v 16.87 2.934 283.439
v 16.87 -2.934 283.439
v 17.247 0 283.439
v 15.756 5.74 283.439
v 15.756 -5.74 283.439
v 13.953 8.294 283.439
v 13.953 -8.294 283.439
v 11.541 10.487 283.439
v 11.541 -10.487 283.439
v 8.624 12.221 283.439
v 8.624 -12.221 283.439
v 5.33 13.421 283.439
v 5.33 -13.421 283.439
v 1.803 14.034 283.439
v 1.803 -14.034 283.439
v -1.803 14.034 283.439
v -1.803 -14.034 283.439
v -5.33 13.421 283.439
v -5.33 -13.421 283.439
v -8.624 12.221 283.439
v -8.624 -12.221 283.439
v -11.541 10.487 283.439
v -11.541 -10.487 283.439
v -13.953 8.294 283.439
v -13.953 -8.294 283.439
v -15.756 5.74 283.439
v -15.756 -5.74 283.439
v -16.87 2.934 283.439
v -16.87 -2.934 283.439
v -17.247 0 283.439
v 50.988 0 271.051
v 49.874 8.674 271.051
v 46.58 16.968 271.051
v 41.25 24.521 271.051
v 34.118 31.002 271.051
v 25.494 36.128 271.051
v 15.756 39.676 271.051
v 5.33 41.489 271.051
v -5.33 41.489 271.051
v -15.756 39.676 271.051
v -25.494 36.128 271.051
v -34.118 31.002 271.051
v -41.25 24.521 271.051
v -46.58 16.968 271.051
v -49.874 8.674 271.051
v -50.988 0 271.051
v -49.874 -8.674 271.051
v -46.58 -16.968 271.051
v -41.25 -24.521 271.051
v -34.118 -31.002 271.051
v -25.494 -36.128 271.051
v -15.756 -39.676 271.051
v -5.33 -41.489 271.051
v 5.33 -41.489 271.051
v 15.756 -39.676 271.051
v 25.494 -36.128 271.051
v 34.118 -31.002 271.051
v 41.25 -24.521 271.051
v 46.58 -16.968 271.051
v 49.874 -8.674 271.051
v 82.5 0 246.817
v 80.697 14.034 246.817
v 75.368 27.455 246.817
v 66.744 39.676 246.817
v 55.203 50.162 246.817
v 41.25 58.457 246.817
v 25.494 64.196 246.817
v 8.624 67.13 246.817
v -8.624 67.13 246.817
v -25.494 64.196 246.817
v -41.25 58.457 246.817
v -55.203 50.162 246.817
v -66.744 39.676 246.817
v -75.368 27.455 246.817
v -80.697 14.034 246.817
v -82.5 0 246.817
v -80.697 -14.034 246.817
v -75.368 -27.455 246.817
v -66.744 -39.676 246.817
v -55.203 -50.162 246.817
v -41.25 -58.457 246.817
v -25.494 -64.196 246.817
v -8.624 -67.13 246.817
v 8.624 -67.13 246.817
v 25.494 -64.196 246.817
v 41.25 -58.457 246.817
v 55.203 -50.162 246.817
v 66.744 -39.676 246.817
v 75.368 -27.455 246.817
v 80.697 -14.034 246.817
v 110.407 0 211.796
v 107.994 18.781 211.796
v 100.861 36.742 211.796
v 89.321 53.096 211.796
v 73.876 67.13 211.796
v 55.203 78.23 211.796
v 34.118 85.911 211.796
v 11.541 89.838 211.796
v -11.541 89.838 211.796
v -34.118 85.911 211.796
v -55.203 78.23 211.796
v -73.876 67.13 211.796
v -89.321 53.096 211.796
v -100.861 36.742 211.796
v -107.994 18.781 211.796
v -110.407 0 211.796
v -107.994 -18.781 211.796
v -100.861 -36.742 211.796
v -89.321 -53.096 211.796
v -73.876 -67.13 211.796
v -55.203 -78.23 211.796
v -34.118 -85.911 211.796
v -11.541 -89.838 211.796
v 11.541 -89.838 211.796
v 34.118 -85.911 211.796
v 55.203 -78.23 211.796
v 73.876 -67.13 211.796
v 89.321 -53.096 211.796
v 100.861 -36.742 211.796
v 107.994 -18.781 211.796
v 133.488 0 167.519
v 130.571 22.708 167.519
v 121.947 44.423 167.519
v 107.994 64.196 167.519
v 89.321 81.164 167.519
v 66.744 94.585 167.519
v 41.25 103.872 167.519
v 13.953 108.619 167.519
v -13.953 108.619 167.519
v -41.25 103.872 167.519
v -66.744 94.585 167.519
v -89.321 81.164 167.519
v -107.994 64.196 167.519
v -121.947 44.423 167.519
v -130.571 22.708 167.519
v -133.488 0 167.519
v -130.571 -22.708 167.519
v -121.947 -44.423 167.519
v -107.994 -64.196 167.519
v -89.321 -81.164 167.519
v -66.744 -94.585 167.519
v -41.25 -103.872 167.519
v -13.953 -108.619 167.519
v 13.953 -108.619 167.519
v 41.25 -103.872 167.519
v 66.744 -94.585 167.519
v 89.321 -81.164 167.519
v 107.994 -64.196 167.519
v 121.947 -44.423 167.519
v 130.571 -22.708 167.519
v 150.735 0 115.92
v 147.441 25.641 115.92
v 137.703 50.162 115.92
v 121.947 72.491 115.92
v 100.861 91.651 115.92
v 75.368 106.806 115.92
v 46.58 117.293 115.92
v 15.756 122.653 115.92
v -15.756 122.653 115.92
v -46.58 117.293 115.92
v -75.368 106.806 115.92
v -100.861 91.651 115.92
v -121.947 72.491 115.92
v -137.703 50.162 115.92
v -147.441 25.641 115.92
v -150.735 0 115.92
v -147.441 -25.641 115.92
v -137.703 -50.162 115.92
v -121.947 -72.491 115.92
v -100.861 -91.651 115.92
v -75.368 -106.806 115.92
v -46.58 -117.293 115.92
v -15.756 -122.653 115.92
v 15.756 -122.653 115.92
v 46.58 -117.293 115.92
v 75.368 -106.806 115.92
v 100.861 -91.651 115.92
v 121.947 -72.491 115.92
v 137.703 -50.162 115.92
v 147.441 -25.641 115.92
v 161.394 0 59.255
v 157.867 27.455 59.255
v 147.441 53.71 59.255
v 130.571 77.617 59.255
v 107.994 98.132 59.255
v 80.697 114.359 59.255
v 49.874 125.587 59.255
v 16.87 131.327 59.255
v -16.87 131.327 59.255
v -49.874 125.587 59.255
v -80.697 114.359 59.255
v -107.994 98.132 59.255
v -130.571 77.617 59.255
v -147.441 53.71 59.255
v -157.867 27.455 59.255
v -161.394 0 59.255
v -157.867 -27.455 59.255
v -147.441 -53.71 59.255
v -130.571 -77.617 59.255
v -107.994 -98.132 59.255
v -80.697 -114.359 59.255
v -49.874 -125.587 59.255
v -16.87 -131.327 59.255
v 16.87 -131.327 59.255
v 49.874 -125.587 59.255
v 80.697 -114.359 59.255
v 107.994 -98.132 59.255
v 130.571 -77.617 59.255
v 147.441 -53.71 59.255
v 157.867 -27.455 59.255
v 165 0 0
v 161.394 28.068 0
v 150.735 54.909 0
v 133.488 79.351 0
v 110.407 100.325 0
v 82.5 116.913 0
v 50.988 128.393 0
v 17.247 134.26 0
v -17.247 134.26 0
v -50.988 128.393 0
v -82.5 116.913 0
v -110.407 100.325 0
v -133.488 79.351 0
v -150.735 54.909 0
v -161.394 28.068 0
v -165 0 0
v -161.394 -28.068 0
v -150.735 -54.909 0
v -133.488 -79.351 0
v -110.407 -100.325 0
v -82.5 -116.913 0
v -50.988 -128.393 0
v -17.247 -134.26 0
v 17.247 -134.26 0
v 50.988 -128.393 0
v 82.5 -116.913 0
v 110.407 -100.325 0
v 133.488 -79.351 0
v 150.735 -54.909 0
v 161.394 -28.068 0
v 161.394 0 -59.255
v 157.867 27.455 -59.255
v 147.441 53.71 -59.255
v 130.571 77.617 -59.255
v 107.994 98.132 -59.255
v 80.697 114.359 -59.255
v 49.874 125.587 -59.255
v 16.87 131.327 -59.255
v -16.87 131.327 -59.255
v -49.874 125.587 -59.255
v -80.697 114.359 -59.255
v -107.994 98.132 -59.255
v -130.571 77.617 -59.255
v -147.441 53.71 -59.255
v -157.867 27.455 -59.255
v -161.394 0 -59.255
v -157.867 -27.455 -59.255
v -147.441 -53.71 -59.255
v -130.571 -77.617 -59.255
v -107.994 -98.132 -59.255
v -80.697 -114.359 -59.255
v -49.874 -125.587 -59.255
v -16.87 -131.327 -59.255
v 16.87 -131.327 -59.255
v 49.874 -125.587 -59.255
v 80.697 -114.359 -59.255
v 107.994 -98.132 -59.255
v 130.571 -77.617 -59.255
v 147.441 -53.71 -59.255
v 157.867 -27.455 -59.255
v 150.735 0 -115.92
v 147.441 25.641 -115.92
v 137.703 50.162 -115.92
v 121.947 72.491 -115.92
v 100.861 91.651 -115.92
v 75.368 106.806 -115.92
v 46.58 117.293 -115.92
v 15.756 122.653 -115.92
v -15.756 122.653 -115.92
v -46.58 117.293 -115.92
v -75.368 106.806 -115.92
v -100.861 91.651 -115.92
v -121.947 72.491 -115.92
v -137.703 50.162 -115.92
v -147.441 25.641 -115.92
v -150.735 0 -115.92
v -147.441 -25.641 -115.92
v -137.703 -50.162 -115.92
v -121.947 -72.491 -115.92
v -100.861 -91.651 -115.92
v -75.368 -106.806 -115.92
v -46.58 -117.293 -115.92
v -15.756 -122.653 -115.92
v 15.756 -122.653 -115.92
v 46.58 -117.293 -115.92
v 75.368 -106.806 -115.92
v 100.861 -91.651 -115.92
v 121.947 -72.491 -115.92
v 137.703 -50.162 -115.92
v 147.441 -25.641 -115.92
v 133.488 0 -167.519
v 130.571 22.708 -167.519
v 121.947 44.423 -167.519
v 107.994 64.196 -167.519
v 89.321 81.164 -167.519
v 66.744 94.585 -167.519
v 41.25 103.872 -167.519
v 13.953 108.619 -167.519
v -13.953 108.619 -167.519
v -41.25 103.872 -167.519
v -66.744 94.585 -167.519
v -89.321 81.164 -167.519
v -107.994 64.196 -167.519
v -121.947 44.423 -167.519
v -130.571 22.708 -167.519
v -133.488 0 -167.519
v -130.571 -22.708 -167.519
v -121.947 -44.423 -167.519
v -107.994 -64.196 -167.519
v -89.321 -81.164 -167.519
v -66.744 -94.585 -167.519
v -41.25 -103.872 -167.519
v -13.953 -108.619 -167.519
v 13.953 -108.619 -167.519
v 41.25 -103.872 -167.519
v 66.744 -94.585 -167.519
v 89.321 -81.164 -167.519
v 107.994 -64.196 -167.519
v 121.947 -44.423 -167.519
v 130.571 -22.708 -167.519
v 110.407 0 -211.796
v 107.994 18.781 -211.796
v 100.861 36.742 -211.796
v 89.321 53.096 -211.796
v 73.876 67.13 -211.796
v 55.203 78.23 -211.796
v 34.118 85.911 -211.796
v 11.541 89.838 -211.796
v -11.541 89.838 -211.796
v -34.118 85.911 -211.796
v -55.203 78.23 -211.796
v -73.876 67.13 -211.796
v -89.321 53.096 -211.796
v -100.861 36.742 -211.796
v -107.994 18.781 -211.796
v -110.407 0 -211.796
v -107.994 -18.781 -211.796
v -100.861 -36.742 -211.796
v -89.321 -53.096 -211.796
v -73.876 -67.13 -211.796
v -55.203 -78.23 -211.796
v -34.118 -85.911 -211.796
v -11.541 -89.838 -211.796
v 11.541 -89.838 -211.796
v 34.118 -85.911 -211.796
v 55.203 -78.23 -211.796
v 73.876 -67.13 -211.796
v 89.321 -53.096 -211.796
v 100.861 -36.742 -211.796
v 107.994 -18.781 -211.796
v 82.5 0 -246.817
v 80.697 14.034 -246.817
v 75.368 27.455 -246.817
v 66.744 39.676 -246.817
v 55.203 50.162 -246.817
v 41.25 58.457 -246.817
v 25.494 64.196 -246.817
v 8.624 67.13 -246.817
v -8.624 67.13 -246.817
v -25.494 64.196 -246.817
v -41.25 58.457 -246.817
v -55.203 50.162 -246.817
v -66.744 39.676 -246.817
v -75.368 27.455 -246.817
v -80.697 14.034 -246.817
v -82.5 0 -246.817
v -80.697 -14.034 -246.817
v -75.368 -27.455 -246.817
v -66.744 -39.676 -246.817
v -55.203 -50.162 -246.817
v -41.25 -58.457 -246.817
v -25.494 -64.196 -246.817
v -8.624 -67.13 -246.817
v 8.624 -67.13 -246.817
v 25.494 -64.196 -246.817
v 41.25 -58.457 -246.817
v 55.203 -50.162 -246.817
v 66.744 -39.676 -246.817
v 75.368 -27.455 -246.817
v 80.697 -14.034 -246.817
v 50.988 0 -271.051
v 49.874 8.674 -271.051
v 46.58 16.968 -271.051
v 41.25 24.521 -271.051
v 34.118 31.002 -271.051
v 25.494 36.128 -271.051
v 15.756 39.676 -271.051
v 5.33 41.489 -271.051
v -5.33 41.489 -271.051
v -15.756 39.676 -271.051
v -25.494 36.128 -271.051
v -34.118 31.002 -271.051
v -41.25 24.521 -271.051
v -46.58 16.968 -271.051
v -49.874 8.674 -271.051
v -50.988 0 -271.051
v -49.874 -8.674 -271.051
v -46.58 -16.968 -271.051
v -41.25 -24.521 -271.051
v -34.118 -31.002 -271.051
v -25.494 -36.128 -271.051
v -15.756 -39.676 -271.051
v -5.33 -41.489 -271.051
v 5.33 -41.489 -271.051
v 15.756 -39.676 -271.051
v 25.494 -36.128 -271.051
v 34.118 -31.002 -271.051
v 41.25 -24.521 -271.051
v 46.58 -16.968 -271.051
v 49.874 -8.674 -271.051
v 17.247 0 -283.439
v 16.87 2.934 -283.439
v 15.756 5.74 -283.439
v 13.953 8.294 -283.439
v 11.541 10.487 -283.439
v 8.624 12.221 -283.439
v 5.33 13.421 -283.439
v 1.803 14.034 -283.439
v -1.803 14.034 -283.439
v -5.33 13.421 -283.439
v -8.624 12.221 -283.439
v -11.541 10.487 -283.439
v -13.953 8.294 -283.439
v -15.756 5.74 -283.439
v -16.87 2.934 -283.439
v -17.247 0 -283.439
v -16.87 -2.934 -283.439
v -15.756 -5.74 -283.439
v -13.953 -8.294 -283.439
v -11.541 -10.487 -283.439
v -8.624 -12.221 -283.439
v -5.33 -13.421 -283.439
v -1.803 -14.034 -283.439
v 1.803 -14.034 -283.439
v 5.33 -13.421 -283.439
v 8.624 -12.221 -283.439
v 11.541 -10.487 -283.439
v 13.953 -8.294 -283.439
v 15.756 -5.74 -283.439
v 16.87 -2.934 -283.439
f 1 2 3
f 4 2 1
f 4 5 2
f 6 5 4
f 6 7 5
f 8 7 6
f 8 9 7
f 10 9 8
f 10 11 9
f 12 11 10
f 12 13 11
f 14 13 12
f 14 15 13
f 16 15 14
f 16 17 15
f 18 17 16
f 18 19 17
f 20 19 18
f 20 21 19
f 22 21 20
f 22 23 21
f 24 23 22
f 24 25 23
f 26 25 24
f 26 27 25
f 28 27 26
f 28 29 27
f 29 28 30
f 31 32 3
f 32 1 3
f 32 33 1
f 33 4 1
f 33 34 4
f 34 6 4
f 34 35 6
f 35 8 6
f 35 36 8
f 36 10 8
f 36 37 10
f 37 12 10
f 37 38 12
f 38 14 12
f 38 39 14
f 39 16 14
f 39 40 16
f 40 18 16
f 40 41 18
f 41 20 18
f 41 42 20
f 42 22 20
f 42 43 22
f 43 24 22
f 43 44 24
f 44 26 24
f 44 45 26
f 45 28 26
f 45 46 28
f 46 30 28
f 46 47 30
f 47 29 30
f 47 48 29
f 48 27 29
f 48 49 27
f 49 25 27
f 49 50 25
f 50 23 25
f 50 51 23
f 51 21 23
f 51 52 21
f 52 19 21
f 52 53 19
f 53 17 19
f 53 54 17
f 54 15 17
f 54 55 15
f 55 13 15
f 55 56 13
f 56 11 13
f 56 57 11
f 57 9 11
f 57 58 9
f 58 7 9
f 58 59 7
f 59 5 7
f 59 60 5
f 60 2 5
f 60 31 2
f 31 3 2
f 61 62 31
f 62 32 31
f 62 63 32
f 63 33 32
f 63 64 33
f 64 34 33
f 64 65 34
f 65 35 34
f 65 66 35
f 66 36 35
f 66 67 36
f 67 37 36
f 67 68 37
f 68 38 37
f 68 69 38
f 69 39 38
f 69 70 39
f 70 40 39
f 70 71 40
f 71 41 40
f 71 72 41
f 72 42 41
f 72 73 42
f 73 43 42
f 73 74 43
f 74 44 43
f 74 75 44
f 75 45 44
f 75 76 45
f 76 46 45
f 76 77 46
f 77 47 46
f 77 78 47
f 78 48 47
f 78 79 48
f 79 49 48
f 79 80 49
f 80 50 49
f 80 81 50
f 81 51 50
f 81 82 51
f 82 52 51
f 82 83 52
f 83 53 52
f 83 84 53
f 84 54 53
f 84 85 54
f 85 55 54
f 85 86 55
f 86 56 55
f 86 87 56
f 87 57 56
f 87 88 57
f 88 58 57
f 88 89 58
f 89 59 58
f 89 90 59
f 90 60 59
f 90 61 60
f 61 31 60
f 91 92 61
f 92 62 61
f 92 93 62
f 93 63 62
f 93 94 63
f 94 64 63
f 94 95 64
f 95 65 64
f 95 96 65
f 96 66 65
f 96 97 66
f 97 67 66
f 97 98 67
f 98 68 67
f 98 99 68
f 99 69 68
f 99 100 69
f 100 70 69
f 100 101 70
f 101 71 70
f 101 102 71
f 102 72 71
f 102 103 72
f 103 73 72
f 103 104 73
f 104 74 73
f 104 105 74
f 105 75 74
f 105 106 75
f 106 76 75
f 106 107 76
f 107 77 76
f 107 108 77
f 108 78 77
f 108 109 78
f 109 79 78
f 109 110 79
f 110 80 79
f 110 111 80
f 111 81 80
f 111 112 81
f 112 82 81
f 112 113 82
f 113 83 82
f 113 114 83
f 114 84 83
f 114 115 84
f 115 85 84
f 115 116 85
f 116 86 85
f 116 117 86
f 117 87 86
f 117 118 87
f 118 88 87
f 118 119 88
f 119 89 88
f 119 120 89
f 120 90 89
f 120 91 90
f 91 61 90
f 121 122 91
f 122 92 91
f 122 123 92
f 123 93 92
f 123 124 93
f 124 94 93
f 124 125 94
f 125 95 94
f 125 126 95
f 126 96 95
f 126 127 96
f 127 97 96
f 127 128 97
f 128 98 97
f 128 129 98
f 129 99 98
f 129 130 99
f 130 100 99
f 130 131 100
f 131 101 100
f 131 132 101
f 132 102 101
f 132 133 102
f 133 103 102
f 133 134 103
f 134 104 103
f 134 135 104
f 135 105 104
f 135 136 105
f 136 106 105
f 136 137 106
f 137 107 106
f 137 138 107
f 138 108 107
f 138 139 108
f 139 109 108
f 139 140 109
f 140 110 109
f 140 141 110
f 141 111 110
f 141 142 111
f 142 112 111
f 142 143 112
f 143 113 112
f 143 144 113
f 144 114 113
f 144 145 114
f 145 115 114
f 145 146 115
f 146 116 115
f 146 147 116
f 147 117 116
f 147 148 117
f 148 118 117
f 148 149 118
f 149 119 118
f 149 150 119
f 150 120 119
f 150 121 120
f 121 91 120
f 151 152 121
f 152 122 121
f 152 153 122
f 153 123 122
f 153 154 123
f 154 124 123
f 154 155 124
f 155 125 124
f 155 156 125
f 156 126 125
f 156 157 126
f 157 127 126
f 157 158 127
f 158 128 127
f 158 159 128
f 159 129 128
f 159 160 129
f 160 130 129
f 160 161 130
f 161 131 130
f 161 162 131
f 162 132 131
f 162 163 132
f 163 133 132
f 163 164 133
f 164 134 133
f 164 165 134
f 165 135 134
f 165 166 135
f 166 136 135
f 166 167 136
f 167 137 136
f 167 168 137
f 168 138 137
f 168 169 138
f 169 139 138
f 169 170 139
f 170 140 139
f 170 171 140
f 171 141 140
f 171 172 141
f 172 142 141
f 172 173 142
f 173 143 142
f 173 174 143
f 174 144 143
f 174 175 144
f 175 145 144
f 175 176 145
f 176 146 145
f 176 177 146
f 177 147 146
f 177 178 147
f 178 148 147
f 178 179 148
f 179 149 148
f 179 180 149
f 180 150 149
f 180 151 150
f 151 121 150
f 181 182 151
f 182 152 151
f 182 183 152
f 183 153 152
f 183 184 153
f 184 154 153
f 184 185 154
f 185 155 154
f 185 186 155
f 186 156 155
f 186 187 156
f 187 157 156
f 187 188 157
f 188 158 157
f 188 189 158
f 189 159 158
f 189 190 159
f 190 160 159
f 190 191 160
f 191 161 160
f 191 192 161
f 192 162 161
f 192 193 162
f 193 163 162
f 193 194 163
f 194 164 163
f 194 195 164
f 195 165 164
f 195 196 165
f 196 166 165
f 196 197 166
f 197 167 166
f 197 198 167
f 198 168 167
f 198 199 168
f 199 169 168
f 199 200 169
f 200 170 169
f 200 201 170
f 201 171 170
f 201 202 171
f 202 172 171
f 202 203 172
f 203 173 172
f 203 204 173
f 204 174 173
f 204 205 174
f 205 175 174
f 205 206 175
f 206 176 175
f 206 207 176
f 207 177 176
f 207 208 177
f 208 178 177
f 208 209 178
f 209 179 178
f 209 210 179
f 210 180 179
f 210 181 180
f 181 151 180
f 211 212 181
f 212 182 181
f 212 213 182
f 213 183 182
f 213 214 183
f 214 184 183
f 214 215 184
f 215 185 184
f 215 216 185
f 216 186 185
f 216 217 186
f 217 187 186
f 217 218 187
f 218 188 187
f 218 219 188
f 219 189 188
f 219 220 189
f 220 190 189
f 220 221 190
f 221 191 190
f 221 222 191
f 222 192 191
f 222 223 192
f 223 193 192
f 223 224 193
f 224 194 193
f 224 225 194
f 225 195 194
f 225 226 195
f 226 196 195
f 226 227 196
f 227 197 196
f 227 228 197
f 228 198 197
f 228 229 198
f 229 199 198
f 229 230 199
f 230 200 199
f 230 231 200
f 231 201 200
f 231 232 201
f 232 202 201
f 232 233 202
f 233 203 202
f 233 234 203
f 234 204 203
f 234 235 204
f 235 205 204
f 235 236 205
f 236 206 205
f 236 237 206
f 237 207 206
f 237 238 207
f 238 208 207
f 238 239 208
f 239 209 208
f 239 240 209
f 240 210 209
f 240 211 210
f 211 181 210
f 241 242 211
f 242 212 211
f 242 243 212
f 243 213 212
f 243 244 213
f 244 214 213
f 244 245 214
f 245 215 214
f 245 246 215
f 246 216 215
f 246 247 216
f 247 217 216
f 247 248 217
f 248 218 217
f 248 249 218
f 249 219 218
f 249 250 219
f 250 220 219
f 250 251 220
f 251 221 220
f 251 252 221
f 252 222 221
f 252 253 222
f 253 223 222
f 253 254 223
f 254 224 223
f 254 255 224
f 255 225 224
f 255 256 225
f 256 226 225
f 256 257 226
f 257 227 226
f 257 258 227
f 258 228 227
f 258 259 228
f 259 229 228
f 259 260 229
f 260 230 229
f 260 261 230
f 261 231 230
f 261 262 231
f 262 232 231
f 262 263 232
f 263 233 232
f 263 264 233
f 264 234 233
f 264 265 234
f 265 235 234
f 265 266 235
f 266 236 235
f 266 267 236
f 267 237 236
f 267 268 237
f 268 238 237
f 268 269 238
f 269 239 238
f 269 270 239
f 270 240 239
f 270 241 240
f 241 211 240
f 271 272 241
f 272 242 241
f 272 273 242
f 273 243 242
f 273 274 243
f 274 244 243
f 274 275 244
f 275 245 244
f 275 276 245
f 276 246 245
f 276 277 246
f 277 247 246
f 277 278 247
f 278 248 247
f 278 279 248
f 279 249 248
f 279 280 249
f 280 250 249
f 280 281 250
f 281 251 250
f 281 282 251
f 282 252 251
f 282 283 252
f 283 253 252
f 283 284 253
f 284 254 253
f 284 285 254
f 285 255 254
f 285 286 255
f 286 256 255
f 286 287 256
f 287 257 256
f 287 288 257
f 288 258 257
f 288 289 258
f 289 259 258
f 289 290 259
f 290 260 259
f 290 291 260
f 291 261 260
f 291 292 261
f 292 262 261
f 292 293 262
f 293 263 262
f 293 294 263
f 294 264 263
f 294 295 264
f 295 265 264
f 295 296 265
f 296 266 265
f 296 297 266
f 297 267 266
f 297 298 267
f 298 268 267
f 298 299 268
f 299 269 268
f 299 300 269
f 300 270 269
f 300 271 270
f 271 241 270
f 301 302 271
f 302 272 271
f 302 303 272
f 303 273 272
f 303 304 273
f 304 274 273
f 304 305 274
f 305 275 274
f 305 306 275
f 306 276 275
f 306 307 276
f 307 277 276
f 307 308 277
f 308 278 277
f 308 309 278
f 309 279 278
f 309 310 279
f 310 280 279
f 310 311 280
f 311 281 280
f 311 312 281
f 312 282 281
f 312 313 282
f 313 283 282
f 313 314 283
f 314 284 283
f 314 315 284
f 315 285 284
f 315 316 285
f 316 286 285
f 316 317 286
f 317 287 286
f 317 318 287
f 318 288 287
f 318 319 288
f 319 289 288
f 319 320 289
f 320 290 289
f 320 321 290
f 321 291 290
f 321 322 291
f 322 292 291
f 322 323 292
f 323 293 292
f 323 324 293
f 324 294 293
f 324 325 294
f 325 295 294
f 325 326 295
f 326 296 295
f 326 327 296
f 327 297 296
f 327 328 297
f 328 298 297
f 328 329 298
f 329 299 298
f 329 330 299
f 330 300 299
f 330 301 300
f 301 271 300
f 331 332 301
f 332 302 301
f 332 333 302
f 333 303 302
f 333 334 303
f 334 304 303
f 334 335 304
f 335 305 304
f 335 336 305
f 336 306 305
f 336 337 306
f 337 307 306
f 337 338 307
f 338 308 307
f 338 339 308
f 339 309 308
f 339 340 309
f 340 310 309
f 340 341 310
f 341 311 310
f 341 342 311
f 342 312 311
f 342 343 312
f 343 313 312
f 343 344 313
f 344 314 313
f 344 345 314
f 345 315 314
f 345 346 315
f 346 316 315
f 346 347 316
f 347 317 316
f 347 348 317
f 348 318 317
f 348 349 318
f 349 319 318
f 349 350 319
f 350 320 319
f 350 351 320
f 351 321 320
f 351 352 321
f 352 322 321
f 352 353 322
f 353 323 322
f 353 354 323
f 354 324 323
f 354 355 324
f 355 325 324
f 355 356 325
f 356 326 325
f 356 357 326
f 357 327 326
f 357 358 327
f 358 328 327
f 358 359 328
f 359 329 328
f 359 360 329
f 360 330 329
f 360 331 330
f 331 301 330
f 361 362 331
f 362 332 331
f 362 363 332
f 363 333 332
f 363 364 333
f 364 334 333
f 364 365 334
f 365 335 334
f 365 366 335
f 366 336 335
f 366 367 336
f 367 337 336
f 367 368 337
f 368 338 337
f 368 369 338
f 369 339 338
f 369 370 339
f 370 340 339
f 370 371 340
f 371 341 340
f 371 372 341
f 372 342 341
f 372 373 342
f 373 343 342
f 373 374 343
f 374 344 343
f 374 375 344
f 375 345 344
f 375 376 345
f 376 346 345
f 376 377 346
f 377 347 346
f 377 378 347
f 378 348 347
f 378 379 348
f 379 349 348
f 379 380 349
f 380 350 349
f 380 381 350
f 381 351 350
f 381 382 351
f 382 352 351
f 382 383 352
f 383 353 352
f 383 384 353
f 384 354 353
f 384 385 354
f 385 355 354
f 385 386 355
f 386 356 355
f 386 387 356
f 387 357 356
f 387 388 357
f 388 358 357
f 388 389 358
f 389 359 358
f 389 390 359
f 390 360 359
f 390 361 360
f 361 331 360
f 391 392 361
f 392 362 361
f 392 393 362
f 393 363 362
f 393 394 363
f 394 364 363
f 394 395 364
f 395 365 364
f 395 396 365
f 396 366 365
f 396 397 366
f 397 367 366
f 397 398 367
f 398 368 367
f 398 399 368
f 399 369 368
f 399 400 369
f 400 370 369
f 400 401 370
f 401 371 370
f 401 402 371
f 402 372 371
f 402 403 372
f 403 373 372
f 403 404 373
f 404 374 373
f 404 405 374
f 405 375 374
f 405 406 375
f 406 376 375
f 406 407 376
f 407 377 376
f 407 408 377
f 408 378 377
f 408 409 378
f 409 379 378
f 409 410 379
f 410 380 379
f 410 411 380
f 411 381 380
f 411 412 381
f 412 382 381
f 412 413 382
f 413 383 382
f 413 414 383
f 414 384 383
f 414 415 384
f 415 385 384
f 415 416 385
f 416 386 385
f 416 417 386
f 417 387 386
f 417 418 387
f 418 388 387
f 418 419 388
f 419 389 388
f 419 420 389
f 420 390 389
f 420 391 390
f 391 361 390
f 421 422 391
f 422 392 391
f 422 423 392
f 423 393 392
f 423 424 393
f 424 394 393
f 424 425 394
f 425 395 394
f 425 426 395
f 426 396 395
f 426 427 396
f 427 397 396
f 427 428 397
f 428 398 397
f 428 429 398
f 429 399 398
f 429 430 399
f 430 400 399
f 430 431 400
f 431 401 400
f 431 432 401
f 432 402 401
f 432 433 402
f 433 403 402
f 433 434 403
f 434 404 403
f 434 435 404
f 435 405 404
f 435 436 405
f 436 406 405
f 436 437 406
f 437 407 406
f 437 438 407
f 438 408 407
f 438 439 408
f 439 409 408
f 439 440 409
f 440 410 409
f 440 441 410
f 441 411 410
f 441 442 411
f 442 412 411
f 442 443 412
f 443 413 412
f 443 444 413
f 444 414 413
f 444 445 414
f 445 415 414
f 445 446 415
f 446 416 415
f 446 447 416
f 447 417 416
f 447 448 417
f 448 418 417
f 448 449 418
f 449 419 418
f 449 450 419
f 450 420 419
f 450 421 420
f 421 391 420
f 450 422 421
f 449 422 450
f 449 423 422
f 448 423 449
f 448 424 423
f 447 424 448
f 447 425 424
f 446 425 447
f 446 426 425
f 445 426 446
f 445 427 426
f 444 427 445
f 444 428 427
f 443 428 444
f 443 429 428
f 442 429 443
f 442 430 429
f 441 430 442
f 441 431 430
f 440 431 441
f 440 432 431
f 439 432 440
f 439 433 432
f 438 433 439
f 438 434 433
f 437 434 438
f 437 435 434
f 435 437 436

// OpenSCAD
// Generated by SolidPython 1.0.1 on 2020-07-29 00:46:49


scale(v = [11, 9, 19]) {
	sphere(r = 15);
}
/***********************************************
*********      SolidPython code:      **********
************************************************
 
# import packages: SolidPython
from solid import *
from solid.utils import *
from itertools import chain, combinations, permutations


class Resize:

    def __init__(self, scad_file):
        self.scad_file = scad_file
        #self.scad_file = import_scad(scad_file)
        # cone/cylinder param:
        self.r1 = 0
        self.r2 = 0
        self.h = 0
        # rectangular prism param:
        self.w = 0
        self.l = 0
        # ellipse param:
        self.r = 0

    # import OpenScad code (file name corresponds to shape)


    # classify shape + parameters
    def assign(self, param1, param2, param3):
        if self.scad_file == 'cone.scad':
            self.r1 = param1
            self.r2 = param2
            self.h = param3
        elif self.scad_file == 'cylinder.scad':
            self.r1 = param1
            self.r2 = param2
            self.h = param3
        elif self.scad_file == 'rectangularPrism.scad':
            self.h = param1
            self.l = param2
            self.w = param3
        else:
            self.r = param1
            self.h = param2

    # resize parameters
    def iterate(self):
        x = range(3, 20, 2)
        i = 1
        if self.scad_file == 'cone.scad':
            tempList = list(permutations(x, 2))
            for temp in tempList:
                param1 = temp[0]
                param2 = temp[1]
                filepath = 'produced_scad_files/' + 'cone' + str(param1) + '_' + str(param2) + '_' + '.scad'
                scad_render_to_file(cylinder(h=param1, r1=param2, r2=0), filepath)

        elif self.scad_file == 'cylinder.scad':
            tempList = list(permutations(x, 3))
            for temp in tempList:
                param1 = temp[0]
                param2 = temp[1]
                filepath = 'produced_scad_files/' + 'cylinder' + str(param1) + '_' + str(param2) + '_' + '.scad'
                scad_render_to_file(cylinder(h=param1, r1=param2, r2=param2), filepath)

        elif self.scad_file == 'rectangularPrism.scad':
            tempList = list(permutations(x, 3))
            for temp in tempList:
                param1 = temp[0]
                param2 = temp[1]
                param3 = temp[2]
                filepath = 'produced_scad_files/' + 'rectangularPrism' + str(param1) + '_' + str(param2) + '_' + str(
                    param3) + '.scad'
                scad_render_to_file(cube(size=(param1, param2, param3)), filepath)

        elif self.scad_file == 'ellipse.scad':
            tempList = list(permutations(x, 4))
            for temp in tempList:
                param1 = temp[0]
                param2 = temp[1]
                param3 = temp[2]
                param4 = temp[3]
                filepath = 'produced_scad_files/' + 'ellipse' + str(param1) + '_' + str(param2) + '_' + str(param3) + '_' + str(param4) + '.scad'
                scad_render_to_file(scale([param1, param2, param3])(sphere(r=param4)), filepath)

    def render_to_scadfile(self):
        scad_render_to_file(scad, 'example.scad') 
 
************************************************/
